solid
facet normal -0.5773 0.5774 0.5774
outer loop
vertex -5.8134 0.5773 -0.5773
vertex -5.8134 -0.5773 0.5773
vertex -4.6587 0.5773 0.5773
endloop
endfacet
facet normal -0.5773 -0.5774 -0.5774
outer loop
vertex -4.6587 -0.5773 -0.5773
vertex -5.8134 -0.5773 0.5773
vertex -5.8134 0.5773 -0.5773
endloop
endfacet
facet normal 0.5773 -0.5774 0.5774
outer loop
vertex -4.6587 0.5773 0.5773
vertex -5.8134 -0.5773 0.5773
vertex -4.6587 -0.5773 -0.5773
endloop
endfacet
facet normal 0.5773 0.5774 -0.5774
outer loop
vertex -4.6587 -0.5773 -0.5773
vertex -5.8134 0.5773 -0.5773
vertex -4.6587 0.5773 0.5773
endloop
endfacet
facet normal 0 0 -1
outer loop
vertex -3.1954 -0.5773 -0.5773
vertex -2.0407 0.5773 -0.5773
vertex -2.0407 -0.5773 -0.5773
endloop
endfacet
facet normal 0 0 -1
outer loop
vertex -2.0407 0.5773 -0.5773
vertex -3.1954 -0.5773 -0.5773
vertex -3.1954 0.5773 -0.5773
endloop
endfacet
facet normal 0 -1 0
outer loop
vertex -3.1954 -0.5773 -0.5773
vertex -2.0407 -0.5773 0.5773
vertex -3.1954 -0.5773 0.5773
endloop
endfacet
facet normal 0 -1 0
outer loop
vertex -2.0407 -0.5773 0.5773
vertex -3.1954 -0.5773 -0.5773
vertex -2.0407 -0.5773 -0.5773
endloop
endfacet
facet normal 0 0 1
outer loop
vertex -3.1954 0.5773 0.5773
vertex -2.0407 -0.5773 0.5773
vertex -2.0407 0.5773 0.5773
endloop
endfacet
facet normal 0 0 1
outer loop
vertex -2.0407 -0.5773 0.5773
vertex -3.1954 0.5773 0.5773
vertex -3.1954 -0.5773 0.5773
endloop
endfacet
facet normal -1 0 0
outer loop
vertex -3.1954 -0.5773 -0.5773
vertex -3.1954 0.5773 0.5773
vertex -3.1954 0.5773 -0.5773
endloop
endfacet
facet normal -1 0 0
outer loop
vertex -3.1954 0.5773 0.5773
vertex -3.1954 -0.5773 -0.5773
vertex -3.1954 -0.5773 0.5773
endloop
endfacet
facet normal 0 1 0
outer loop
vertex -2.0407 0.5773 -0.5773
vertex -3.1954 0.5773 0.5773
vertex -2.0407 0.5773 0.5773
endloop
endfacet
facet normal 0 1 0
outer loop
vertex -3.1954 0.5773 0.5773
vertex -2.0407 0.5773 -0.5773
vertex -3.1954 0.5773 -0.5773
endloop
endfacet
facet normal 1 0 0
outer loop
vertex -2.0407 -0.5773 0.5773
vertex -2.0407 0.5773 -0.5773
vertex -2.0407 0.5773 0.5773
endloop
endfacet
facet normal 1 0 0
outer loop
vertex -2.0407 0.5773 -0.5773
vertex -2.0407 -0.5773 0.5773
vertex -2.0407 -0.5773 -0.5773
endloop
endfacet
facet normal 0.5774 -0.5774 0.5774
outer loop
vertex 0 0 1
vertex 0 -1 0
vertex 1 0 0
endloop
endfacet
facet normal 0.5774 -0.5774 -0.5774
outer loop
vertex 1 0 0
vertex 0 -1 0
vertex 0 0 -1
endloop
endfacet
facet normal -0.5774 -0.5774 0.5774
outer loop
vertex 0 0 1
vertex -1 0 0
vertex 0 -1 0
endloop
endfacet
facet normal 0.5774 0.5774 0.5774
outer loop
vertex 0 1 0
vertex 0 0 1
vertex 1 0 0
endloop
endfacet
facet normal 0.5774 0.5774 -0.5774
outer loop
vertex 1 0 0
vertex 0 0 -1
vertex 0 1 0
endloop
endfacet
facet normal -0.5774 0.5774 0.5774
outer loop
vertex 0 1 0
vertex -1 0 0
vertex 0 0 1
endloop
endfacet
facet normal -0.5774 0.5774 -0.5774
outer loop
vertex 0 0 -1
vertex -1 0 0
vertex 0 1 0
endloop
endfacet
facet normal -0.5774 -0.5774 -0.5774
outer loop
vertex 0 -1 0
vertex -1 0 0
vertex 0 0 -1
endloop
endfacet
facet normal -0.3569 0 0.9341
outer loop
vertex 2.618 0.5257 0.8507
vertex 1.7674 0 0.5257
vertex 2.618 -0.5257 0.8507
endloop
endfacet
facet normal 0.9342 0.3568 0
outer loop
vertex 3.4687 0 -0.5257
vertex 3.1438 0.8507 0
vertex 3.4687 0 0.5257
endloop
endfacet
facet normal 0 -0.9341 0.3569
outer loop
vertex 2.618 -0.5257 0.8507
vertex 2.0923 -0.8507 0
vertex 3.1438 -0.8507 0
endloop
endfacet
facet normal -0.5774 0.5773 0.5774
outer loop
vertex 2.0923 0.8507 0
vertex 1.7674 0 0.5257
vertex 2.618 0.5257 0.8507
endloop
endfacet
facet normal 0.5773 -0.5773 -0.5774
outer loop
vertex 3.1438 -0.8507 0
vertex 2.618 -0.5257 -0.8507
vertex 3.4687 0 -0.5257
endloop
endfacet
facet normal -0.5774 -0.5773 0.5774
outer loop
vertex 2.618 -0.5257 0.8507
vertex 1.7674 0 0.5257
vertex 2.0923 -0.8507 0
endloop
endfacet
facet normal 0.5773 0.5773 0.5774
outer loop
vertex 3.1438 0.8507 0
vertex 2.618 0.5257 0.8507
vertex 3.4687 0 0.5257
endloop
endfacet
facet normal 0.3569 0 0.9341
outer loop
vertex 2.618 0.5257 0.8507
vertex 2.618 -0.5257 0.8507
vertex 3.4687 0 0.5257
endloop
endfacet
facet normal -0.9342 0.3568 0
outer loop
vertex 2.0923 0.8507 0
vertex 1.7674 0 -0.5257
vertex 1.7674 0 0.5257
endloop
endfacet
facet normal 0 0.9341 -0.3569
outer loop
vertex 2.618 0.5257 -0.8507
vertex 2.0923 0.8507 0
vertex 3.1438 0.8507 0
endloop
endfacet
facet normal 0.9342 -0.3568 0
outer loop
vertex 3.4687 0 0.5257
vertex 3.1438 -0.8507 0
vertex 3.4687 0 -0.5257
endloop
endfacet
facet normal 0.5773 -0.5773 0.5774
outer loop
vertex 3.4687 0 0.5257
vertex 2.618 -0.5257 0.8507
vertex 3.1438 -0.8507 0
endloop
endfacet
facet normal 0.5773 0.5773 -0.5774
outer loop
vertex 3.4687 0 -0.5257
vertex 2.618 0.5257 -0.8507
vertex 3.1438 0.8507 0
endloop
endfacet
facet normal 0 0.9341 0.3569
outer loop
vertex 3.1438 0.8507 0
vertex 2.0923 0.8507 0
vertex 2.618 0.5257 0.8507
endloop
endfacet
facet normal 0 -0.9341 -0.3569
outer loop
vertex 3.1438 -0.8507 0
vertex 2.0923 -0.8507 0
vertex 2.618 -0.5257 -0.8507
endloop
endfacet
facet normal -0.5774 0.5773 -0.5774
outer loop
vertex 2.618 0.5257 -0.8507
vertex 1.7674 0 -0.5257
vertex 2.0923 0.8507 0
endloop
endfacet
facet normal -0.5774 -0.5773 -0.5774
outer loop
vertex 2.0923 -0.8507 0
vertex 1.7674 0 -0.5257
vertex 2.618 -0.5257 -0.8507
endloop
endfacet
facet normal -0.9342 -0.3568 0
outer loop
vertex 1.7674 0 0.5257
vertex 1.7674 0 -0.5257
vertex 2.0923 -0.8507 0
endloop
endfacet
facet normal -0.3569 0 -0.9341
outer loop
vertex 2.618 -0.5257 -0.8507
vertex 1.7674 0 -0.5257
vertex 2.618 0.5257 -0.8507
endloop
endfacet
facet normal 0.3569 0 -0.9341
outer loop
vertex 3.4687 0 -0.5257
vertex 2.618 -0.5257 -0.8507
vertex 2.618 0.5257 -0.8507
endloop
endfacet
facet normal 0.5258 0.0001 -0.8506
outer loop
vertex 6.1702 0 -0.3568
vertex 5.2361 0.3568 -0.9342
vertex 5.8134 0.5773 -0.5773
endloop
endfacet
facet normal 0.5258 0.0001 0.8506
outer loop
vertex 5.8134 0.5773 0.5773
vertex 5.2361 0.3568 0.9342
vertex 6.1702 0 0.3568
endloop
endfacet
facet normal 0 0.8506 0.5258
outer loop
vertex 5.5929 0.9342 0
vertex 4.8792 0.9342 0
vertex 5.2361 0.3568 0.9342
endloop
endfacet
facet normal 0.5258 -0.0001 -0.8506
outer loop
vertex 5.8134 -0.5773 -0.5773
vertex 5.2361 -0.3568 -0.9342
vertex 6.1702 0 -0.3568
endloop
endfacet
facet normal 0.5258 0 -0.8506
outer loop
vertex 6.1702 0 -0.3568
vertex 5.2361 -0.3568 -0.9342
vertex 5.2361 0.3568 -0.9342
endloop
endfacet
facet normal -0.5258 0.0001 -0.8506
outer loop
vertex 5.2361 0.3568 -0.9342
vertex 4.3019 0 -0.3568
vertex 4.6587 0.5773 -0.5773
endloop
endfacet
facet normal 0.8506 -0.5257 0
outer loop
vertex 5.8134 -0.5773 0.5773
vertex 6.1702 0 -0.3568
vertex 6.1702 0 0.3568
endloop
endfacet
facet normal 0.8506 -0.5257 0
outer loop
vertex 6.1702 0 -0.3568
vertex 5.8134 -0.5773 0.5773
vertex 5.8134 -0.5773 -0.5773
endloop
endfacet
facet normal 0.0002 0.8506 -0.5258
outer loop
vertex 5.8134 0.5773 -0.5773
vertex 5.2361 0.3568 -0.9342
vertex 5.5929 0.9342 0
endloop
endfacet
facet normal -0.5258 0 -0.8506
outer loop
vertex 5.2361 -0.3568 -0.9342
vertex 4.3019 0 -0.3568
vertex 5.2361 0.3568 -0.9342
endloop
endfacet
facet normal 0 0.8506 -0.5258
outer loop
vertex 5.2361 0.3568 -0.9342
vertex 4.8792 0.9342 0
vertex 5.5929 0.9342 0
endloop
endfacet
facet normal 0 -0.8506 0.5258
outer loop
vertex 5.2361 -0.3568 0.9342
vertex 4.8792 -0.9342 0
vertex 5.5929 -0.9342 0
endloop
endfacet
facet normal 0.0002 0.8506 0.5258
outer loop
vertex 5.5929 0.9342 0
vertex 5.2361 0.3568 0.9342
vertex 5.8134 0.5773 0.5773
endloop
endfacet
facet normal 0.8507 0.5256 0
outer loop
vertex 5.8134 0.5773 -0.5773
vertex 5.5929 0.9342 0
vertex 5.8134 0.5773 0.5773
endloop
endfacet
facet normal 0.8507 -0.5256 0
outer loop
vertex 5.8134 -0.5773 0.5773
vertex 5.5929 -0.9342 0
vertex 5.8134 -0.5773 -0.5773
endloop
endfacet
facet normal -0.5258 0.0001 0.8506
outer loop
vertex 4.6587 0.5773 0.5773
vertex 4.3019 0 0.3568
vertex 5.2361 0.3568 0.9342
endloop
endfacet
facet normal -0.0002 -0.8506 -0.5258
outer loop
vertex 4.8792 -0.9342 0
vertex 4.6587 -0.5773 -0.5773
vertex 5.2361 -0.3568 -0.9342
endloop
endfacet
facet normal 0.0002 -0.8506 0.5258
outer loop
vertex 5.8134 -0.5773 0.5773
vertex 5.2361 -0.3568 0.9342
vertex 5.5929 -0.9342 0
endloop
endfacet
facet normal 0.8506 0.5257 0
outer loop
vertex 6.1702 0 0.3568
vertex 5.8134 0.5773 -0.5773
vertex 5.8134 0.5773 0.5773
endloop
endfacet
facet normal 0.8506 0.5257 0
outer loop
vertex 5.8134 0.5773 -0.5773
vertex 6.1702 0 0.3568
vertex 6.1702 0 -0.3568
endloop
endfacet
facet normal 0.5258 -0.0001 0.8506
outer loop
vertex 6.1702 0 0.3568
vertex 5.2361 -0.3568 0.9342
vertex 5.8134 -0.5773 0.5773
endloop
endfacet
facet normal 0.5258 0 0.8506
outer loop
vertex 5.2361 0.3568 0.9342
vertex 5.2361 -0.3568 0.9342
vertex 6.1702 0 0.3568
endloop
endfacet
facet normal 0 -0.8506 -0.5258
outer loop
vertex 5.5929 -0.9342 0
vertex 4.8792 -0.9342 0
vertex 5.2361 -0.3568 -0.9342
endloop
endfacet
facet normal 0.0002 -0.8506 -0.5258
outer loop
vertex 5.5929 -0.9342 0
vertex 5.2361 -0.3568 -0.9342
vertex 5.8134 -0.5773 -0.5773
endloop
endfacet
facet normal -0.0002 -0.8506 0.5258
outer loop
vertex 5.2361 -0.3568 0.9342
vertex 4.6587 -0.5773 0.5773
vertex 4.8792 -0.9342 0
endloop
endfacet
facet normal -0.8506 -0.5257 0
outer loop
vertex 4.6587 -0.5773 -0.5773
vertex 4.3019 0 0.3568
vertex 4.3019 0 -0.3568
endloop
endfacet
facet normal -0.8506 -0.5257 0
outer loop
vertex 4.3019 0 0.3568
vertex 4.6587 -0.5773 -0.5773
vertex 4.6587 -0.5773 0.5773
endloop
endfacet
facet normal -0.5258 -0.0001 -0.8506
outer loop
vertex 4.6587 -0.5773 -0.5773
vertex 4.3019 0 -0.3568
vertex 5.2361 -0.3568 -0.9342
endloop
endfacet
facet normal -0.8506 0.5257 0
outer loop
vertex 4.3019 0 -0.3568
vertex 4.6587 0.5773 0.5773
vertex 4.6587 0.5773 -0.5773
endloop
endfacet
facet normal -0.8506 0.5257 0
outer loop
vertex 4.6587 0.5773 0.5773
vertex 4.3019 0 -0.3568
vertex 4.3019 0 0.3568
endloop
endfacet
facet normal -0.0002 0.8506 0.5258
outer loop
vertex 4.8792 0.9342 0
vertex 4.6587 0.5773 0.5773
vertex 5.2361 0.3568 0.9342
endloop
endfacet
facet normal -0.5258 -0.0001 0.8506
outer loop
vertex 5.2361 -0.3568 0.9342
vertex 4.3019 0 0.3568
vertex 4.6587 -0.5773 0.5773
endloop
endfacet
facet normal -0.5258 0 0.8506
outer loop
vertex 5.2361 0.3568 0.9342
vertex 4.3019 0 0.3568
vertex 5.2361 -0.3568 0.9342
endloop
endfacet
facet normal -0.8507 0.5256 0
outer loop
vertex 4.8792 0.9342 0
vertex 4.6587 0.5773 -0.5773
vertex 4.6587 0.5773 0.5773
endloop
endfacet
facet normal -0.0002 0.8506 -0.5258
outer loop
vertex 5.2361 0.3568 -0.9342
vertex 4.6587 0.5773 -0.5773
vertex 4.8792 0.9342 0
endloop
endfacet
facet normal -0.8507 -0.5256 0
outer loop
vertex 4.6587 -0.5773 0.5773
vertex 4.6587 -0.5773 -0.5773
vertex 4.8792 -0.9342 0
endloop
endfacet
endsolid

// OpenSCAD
$fn = 100;

$vpt = [0, 0, 0];

$vpr = [0, 360, 0];

$vpd = 20;

phi = (1+sqrt(5))/2;

module tetrahedron() {
    
    vertices = [
        [-1/sqrt(3), 1/sqrt(3), -1/sqrt(3)],
        [1/sqrt(3), 1/sqrt(3), 1/sqrt(3)],
        [-1/sqrt(3), -1/sqrt(3), 1/sqrt(3)],
        [1/sqrt(3), -1/sqrt(3), -1/sqrt(3)]
    ];
    
    hull(){
    polyhedron( vertices , [[ each [ 0 : len(vertices) - 1 ] ] ] );
    }

}

module hexahedron() {
    
    vertices = [
        [-1/sqrt(3), 1/sqrt(3), -1/sqrt(3)],
        [-1/sqrt(3), 1/sqrt(3), 1/sqrt(3)],
        [-1/sqrt(3), -1/sqrt(3), -1/sqrt(3)],
        [1/sqrt(3), -1/sqrt(3), 1/sqrt(3)],
        [-1/sqrt(3), -1/sqrt(3), 1/sqrt(3)],
        [1/sqrt(3), -1/sqrt(3), -1/sqrt(3)],
        [1/sqrt(3), 1/sqrt(3), -1/sqrt(3)],
        [1/sqrt(3), 1/sqrt(3), 1/sqrt(3)]
    ];
    
    hull(){
    polyhedron( vertices , [[ each [ 0 : len(vertices) - 1 ] ] ] );
    }

}
module octahedron() {
    
    vertices = [
        [0, 1, 0],
        [0, -1, 0],
        [1, 0, 0],
        [-1, 0, 0],
        [0, 0, -1],
        [0, 0, 1],
    ];
            
    hull(){
    polyhedron( vertices , [[ each [ 0 : len(vertices) - 1 ] ] ] );
    }

}

module icosahedron() {
    
    vertices = [
        [0, sqrt(1/2 - 1/(2*sqrt(5))), -sqrt(1/2 - 1/(2*sqrt(5)))*phi],
        [sqrt(1/2 - 1/(2*sqrt(5)))*phi, 0, sqrt(1/2 - 1/(2*sqrt(5)))],
        [-sqrt(1/2 - 1/(2*sqrt(5))), -sqrt(1/2 - 1/(2*sqrt(5)))*phi, 0],
        [sqrt(1/2 - 1/(2*sqrt(5)))*phi, 0, -sqrt(1/2 - 1/(2*sqrt(5)))],
        [0, -sqrt(1/2 - 1/(2*sqrt(5))), -sqrt(1/2 - 1/(2*sqrt(5)))*phi],
        [sqrt(1/2 - 1/(2*sqrt(5))), -sqrt(1/2 - 1/(2*sqrt(5)))*phi, 0],
        [-sqrt(1/2 - 1/(2*sqrt(5))), sqrt(1/2 - 1/(2*sqrt(5)))*phi, 0],
        [sqrt(1/2 - 1/(2*sqrt(5))), sqrt(1/2 - 1/(2*sqrt(5)))*phi, 0],
        [-sqrt(1/2 - 1/(2*sqrt(5)))*phi, 0, -sqrt(1/2 - 1/(2*sqrt(5)))],
        [0, sqrt(1/2 - 1/(2*sqrt(5))), sqrt(1/2 - 1/(2*sqrt(5)))*phi],
        [-sqrt(1/2 - 1/(2*sqrt(5)))*phi, 0, sqrt(1/2 - 1/(2*sqrt(5)))],
        [0, -sqrt(1/2 - 1/(2*sqrt(5))), sqrt(1/2 - 1/(2*sqrt(5)))*phi]
    ];
            
    hull(){
    polyhedron( vertices , [[ each [ 0 : len(vertices) - 1 ] ] ] );
    }

}
module dodecahedron() {
    
    vertices = [
        [(phi/sqrt(phi^4+1))/phi, (phi/sqrt(phi^4+1))*phi, 0],
        [-(phi/sqrt(phi^4+1)), (phi/sqrt(phi^4+1)), -(phi/sqrt(phi^4+1))],
        [-(phi/sqrt(phi^4+1)), (phi/sqrt(phi^4+1)), (phi/sqrt(phi^4+1))],
        [-(phi/sqrt(phi^4+1))/phi, phi*(phi/sqrt(phi^4+1)), 0],
        [(phi/sqrt(phi^4+1)), -(phi/sqrt(phi^4+1)), (phi/sqrt(phi^4+1))],
        [-(phi/sqrt(phi^4+1))/phi, -phi*(phi/sqrt(phi^4+1)), 0],
        [(phi/sqrt(phi^4+1)), -(phi/sqrt(phi^4+1)), -(phi/sqrt(phi^4+1))],
        [0, (phi/sqrt(phi^4+1))/phi, -phi*(phi/sqrt(phi^4+1))],
        [-phi*(phi/sqrt(phi^4+1)), 0, (phi/sqrt(phi^4+1))/phi],
        [phi*(phi/sqrt(phi^4+1)), 0, -(phi/sqrt(phi^4+1))/phi],
        [0, (phi/sqrt(phi^4+1))/phi, phi*(phi/sqrt(phi^4+1))],
        [-(phi/sqrt(phi^4+1)), -(phi/sqrt(phi^4+1)), -(phi/sqrt(phi^4+1))],
        [-(phi/sqrt(phi^4+1)), -(phi/sqrt(phi^4+1)), (phi/sqrt(phi^4+1))],
        [-phi*(phi/sqrt(phi^4+1)), 0, -(phi/sqrt(phi^4+1))/phi],
        [0, -(phi/sqrt(phi^4+1))/phi, -phi*(phi/sqrt(phi^4+1))],
        [0, -(phi/sqrt(phi^4+1))/phi, phi*(phi/sqrt(phi^4+1))],
        [(phi/sqrt(phi^4+1))/phi, -phi*(phi/sqrt(phi^4+1)), 0],
        [phi*(phi/sqrt(phi^4+1)), 0, (phi/sqrt(phi^4+1))/phi],
        [(phi/sqrt(phi^4+1)), (phi/sqrt(phi^4+1)), -(phi/sqrt(phi^4+1))],
        [(phi/sqrt(phi^4+1)), (phi/sqrt(phi^4+1)), (phi/sqrt(phi^4+1))]
    ];
            
    hull(){
    polyhedron( vertices , [[ each [ 0 : len(vertices) - 1 ] ] ] );
    }

}







translate([-2*phi^2,0,0]) {


color( c = [0.5, 0, 1, 0.5]) {
rotate([360*$t,360*$t,360*$t]){
tetrahedron();
}
}
    


translate([phi^2, 0, 0]) {

    color( c = [0.5, 0, 1, 0.5])
    rotate([-360*$t,360*$t,360*$t]){
    hexahedron();
    }


}

translate([2*phi^2, 0, 0]) {
    
    color( c = [0.5, 0, 1, 0.5])
    rotate([-360*$t,-360*$t,360*$t]){
    octahedron();
    }

    
    
    }

translate([3*phi^2, 0, 0]) {
    
    color( c = [0.5, 0, 1, 0.5])
    rotate([-360*$t,-360*$t,-360*$t]){
    icosahedron();
    }


}

translate([4*phi^2, 0, 0]) {

    color( c = [0.5, 0, 1, 0.5])
    rotate([360*$t,-360*$t,-360*$t]){
    dodecahedron();
    }

    
}

}
